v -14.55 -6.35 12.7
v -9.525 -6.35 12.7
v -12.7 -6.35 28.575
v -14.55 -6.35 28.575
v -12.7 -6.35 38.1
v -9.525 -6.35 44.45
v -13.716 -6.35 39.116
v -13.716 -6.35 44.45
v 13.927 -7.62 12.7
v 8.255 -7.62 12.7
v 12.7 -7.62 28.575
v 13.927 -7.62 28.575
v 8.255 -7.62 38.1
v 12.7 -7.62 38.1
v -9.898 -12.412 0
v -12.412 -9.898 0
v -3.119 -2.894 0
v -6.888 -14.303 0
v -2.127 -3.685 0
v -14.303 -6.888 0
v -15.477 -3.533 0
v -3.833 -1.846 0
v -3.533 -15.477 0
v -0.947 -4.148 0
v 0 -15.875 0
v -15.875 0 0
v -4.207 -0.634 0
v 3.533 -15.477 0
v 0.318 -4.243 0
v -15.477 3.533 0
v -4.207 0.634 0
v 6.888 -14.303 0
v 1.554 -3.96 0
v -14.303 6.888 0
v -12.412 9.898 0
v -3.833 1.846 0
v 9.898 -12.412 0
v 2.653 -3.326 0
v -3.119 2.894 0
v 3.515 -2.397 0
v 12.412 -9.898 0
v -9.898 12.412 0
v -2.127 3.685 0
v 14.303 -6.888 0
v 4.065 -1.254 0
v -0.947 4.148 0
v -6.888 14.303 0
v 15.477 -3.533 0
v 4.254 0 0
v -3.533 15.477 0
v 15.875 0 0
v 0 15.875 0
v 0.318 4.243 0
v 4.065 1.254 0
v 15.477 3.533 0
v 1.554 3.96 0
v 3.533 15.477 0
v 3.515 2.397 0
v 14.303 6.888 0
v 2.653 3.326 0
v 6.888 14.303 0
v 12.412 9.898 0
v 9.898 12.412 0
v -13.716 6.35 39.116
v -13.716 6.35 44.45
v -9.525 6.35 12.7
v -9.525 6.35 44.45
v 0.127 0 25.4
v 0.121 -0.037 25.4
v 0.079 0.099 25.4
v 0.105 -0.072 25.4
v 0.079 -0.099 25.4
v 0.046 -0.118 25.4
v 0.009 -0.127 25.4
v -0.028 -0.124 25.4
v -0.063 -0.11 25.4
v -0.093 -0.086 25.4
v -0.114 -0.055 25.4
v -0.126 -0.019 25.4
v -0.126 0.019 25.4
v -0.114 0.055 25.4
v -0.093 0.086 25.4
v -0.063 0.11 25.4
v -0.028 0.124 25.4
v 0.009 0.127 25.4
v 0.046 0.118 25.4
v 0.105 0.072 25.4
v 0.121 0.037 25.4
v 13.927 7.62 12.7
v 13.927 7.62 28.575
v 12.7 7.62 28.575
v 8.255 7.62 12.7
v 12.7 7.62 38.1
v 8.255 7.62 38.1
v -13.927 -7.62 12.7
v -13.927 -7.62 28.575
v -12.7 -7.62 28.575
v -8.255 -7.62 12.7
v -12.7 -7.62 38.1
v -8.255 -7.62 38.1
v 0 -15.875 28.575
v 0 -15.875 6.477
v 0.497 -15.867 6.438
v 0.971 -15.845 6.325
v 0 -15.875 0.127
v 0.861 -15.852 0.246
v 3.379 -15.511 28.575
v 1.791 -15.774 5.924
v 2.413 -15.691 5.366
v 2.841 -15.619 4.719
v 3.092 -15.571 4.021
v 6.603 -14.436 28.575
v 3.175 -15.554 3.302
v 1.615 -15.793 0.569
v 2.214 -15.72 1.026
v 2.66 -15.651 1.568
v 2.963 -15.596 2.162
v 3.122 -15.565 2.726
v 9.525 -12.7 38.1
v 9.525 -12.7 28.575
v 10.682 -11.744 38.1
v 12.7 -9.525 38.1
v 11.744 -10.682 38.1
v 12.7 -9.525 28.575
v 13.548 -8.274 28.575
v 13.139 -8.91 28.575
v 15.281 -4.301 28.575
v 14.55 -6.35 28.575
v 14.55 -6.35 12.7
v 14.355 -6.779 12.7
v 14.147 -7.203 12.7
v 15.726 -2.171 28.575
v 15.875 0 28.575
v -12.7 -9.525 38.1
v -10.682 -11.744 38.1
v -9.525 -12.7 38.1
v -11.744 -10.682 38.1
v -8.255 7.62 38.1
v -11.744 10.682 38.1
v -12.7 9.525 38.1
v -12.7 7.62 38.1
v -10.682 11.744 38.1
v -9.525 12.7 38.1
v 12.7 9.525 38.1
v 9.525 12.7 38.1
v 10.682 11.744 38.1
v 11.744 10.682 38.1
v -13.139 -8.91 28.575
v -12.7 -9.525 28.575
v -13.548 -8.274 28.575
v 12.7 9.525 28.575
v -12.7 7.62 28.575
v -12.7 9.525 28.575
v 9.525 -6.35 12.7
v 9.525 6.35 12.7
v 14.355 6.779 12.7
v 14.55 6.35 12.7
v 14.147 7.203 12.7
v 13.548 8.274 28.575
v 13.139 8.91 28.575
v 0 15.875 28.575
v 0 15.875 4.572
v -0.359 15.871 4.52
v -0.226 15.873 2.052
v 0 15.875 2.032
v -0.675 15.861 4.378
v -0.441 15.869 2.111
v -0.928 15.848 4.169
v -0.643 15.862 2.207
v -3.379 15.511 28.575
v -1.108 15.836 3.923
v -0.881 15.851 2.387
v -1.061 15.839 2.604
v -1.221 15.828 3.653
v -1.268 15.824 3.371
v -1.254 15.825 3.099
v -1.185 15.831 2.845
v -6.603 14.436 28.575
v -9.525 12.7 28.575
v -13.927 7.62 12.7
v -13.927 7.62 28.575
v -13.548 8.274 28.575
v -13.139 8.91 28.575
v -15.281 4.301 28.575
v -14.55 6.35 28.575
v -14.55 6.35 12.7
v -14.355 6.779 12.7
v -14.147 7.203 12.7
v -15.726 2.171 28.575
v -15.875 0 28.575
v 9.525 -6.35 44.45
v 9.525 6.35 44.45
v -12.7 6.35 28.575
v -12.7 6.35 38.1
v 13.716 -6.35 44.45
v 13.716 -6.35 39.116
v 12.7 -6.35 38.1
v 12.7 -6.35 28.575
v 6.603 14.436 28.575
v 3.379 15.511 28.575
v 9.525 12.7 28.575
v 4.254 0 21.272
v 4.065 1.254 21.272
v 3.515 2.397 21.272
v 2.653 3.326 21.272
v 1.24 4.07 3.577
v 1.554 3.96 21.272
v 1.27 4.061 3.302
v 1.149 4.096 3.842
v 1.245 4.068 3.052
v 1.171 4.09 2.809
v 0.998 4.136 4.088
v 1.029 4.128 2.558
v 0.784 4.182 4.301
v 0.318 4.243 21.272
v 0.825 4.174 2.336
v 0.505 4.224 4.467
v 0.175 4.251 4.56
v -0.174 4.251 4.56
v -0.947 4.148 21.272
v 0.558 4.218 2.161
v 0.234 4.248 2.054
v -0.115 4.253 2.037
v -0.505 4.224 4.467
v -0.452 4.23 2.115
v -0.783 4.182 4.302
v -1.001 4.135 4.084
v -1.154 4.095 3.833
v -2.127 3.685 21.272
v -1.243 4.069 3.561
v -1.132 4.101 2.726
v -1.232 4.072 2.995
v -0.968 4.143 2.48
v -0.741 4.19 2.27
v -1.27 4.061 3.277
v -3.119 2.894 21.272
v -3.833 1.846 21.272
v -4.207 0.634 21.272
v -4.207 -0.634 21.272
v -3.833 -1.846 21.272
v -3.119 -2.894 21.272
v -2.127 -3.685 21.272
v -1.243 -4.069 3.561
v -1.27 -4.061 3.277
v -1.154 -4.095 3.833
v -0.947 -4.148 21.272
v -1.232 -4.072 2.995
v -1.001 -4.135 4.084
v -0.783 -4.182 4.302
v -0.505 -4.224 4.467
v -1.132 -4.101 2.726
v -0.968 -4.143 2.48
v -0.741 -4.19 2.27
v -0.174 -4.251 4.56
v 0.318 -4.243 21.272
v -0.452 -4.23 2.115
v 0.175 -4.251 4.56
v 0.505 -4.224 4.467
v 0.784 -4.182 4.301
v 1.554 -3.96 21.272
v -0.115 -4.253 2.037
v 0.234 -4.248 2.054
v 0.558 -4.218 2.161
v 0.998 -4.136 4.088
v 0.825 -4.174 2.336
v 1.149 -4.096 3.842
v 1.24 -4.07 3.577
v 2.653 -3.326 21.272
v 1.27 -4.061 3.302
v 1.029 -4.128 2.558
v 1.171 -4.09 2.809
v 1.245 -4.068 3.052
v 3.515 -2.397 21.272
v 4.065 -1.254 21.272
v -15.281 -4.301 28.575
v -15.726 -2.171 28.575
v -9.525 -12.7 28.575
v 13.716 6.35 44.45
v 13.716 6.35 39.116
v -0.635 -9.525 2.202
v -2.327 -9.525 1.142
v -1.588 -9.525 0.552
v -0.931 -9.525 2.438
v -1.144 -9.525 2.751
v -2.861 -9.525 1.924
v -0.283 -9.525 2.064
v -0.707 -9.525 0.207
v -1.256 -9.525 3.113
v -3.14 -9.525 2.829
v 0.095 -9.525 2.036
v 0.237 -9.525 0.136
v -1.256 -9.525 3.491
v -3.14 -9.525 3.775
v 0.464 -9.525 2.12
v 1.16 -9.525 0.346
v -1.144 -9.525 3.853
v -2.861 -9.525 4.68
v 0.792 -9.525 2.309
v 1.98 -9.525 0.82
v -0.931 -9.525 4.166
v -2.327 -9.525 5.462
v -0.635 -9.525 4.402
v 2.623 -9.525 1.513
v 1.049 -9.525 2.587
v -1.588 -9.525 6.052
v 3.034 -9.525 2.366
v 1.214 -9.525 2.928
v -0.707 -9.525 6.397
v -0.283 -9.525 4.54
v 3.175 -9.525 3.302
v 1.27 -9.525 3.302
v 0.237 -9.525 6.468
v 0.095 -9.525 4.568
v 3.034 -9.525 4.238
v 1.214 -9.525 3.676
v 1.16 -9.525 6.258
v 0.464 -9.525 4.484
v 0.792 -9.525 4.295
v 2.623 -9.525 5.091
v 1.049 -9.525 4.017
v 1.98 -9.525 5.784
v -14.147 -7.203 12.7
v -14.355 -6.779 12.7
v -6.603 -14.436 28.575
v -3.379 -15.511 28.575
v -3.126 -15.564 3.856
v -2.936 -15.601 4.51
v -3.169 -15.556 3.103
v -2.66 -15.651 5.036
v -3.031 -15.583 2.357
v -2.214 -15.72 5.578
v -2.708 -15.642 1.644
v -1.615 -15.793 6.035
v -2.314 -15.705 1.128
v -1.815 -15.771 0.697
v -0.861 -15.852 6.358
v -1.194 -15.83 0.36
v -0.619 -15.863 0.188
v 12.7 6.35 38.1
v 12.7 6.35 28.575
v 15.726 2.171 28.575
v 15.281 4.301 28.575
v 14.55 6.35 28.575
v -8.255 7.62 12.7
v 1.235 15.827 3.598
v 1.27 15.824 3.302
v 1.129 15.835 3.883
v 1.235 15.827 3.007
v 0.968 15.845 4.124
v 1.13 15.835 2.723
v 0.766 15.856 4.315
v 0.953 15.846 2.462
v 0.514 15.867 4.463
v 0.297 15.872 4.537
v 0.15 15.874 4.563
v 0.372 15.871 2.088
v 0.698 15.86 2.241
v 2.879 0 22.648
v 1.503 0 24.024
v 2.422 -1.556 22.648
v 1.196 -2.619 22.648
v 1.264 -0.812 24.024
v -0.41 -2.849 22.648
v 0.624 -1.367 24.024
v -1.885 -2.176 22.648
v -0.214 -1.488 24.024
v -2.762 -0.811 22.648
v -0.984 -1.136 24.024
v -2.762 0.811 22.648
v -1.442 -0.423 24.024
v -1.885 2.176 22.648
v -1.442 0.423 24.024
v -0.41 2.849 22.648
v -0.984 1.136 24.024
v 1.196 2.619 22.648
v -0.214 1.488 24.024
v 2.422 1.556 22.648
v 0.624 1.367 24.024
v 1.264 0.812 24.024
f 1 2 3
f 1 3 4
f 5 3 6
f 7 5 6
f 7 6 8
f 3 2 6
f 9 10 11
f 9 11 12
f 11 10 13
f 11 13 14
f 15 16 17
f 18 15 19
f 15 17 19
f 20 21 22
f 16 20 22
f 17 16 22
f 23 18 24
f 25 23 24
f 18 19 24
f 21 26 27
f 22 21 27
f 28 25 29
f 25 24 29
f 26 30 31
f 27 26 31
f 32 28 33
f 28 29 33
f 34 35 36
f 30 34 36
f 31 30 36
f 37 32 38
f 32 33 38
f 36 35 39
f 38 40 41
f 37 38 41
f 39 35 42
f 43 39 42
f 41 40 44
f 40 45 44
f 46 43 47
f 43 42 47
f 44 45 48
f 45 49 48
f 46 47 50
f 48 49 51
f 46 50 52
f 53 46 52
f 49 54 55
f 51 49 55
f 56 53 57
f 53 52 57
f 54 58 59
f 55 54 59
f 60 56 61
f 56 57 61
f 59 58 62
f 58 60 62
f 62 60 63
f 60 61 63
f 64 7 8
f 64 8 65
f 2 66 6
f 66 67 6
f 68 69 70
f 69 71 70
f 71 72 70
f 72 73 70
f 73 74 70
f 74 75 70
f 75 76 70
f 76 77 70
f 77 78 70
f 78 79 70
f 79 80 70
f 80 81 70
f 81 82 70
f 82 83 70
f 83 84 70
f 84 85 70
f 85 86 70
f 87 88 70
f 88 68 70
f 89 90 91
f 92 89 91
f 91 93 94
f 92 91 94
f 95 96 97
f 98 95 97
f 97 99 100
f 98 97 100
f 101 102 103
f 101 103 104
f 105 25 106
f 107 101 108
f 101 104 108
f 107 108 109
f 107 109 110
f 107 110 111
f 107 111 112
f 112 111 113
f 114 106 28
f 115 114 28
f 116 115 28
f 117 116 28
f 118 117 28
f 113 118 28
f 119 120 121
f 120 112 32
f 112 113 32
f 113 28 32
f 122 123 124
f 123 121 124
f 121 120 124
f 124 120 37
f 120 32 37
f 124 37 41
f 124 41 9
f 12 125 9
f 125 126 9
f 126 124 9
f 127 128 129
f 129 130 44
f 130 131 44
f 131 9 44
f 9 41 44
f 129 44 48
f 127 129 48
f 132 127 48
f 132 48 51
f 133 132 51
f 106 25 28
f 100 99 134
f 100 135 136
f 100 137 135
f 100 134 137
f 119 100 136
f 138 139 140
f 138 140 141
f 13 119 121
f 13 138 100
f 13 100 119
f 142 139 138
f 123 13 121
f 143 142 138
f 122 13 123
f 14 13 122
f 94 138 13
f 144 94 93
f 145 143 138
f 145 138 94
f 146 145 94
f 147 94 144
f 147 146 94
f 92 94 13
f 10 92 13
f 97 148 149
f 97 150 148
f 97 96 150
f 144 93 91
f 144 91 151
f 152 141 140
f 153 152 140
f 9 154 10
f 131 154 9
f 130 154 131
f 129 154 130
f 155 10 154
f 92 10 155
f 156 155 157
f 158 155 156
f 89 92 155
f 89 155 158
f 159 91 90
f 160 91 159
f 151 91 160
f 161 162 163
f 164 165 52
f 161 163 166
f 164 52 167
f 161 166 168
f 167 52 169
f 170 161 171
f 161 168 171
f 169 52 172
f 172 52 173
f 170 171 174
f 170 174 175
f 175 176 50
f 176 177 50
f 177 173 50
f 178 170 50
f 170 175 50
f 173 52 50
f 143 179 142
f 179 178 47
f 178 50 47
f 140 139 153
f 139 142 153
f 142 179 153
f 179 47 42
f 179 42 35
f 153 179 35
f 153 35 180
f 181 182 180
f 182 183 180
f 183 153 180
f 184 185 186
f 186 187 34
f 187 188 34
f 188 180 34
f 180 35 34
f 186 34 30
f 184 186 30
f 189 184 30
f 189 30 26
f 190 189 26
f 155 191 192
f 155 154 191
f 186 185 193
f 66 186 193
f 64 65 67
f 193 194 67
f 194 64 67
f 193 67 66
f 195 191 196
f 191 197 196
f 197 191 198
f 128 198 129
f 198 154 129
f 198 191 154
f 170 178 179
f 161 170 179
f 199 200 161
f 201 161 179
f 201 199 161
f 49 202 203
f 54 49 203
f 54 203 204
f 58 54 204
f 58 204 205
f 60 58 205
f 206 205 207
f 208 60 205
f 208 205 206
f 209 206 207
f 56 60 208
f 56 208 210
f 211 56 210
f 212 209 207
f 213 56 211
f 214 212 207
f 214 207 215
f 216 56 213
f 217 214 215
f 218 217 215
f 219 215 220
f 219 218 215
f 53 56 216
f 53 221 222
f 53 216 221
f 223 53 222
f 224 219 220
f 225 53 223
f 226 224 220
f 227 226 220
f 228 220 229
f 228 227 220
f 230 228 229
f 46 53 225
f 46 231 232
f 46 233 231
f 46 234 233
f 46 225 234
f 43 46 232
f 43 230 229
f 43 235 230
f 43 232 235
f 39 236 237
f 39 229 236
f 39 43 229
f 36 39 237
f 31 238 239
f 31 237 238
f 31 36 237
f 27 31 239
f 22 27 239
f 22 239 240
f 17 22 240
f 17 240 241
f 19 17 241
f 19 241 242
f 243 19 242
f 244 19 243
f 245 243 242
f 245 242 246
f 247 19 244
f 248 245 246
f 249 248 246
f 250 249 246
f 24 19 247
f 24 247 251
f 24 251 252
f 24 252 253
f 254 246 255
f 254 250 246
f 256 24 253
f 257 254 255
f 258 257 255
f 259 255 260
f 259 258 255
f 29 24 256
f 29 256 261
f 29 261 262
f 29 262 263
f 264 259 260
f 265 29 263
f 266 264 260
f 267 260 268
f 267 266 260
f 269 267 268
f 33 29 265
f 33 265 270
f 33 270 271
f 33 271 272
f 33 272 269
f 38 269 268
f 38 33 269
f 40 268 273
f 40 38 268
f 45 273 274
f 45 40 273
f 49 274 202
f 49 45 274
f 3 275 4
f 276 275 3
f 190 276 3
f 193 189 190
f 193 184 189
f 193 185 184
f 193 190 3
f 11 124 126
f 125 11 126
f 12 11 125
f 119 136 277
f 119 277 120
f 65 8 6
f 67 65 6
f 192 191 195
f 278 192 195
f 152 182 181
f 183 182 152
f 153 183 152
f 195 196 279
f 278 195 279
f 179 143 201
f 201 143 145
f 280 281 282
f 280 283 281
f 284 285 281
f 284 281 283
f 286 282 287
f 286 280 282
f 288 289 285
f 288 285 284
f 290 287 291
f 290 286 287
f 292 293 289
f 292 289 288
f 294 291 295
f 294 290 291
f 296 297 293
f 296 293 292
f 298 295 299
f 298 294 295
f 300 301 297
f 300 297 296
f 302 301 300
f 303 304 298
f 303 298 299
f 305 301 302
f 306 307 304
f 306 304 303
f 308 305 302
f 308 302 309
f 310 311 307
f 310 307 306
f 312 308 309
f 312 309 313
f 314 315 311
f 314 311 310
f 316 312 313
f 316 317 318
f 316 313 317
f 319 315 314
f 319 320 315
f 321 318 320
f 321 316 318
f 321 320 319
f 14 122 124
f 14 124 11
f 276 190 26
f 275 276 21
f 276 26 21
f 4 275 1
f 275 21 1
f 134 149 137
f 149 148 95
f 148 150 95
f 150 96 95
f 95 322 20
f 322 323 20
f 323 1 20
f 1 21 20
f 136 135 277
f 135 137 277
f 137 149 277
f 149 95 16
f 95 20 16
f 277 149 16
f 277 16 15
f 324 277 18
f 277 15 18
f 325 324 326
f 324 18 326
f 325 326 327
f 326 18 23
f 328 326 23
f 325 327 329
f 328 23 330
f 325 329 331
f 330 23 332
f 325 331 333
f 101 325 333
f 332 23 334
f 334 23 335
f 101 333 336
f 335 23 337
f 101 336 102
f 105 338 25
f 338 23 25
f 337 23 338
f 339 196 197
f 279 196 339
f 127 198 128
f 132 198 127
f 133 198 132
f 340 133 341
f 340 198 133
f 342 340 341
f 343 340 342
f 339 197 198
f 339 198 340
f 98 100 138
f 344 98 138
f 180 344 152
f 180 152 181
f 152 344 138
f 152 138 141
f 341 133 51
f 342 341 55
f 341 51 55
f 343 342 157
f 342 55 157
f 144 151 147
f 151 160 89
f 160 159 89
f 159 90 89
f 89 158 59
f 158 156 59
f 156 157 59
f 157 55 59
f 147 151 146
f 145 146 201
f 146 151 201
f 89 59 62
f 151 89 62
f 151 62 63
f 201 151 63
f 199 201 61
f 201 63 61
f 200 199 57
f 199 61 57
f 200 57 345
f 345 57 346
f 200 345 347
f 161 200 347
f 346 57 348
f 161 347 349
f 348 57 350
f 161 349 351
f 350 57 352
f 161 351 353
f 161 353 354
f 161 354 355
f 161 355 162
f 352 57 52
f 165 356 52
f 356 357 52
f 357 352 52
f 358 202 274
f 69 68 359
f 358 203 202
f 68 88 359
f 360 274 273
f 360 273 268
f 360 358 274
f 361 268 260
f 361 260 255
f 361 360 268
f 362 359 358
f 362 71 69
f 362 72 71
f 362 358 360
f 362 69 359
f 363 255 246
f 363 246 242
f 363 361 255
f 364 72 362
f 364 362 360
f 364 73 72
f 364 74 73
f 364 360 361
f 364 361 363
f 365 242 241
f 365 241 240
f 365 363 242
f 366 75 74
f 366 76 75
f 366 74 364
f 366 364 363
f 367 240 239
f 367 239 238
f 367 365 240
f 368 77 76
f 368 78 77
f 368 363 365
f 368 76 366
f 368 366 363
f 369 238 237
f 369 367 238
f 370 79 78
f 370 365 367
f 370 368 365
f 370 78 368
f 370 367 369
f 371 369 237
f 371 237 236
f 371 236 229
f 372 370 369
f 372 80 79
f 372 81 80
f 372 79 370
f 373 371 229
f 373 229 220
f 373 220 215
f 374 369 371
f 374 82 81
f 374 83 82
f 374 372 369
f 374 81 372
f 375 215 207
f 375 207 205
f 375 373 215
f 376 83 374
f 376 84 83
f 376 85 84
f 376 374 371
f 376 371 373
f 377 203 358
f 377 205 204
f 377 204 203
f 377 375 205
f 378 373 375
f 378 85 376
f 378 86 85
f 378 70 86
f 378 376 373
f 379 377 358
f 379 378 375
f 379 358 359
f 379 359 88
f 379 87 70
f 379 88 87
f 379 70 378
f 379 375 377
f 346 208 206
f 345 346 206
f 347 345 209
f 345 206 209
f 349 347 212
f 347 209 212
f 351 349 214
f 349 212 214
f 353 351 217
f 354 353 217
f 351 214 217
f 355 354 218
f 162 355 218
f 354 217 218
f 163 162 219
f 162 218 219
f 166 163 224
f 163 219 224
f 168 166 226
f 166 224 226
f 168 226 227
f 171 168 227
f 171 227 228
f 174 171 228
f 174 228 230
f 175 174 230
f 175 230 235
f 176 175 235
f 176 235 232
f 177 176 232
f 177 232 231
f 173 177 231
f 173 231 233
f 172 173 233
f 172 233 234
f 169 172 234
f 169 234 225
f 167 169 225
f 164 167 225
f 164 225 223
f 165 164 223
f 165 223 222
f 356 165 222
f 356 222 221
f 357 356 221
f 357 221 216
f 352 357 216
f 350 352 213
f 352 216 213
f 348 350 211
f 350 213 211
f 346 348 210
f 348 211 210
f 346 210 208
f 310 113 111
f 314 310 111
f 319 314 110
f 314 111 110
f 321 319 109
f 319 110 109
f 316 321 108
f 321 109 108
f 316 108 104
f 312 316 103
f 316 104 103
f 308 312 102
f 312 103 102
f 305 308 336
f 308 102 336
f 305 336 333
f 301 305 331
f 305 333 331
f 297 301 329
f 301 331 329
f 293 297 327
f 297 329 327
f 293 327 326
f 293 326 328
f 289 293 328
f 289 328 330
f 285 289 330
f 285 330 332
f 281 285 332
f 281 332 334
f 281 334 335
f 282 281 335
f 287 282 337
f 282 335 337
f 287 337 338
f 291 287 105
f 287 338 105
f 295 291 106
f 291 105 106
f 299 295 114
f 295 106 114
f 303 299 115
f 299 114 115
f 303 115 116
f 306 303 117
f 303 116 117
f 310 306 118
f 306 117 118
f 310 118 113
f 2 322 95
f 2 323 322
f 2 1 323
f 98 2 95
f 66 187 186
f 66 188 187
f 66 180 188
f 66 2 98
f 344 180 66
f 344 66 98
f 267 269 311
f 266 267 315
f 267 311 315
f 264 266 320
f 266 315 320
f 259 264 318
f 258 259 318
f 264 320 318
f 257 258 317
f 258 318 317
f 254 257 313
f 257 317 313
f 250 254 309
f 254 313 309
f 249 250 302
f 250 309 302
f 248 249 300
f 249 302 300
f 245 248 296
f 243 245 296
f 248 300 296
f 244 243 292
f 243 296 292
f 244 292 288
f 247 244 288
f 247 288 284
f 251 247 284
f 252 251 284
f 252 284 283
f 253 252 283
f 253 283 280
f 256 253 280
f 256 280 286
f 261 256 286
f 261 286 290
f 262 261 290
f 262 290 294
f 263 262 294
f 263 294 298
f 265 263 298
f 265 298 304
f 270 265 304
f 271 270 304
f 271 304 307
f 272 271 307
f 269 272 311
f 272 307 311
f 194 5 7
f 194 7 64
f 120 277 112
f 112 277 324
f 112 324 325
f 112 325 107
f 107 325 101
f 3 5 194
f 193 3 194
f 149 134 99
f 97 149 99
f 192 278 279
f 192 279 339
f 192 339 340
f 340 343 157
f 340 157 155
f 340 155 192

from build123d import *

# Parameters (mm, degrees)
F0_W      = 31.75
F0_H      = 31.75
F0_R      = 4.2545
F1_DEPTH  = 38.1
F2_R      = 1.27
F3_DEPTH  = 76.2
F2_R_2    = 3.175
F4_DEPTH  = 6.35
F6_W      = 31.75
F6_H      = 31.75
F6_W_2    = 25.4
F6_H_2    = 25.4
F7_DEPTH  = 9.525
F8_DEPTH  = 101.6
F9_W      = 3.175
F9_H      = 1.27
F9_W_2    = 1.27
F9_H_2    = 12.7
F10_DEPTH = 25.4
F11_W     = 3.175
F11_H     = 12.7
F11_W_2   = 1.016
F11_W_3   = 4.191
F12_DEPTH = 6.35
F13_SIZE  = 1.01599
F14_W     = 12.7
F14_H     = 12.7
F14_R     = 4.2545
F15_DEPTH = 12.7
F16_SIZE  = 4.1275


# Not quite as in the source:
# - a fillet or chamfer is up to 0.001 mm smaller than in the source, because OpenCascade refuses the exact size


with BuildPart() as f1:
    # F0 (on Top) → F1 (new body)
    with BuildSketch(Plane.XY):
        Rectangle(F0_W, F0_H)
        Circle(F0_R, mode=Mode.SUBTRACT)
    extrude(amount=F1_DEPTH)

    # F2 (on face) → F3 (cut)
    with BuildSketch(Plane.XZ.offset(15.875)):
        with Locations((0, 3.302)):
            Circle(F2_R)
    extrude(amount=-F3_DEPTH, mode=Mode.SUBTRACT)

    # F2 (on face) → F4 (cut)
    with BuildSketch(Plane.XZ.offset(15.875)):
        with Locations((0, 3.302)):
            Circle(F2_R_2)
        with Locations((0, 3.302)):
            Circle(F2_R, mode=Mode.SUBTRACT)
    extrude(amount=-F4_DEPTH, mode=Mode.SUBTRACT)

    # F6 (on face) → F7 (cut)
    with BuildSketch(Plane.XY.offset(38.1)):
        Rectangle(F6_W, F6_H)
        Rectangle(F6_W_2, F6_H_2, mode=Mode.SUBTRACT)
    extrude(amount=-F7_DEPTH, mode=Mode.SUBTRACT)

    # F5 (on face) → F8 (cut)
    with BuildSketch(Plane(origin=(0, 0, 0), x_dir=(1, 0, 0), z_dir=(0, 0, -1))):
        with BuildLine():
            Line((15.875, -15.875), (15.875, 0))
            ThreePointArc((15.875, 0), (11.2253201706, -11.2253201321), (5.44e-08, -15.875))
            Line((5.44e-08, -15.875), (15.875, -15.875))
        make_face()
        with BuildLine():
            Line((-15.875, -15.875), (5.44e-08, -15.875))
            ThreePointArc((5.44e-08, -15.875), (-11.2253201321, -11.2253201706), (-15.875, 0))
            Line((-15.875, 0), (-15.875, -15.875))
        make_face()
        with BuildLine():
            ThreePointArc((-15.875, 0), (-11.2253201513, 11.2253201513), (0, 15.875))
            Line((0, 15.875), (-15.875, 15.875))
            Line((-15.875, 15.875), (-15.875, 0))
        make_face()
        with BuildLine():
            ThreePointArc((0, 15.875), (11.2253201513, 11.2253201513), (15.875, 0))
            Line((15.875, 0), (15.875, 15.875))
            Line((15.875, 15.875), (0, 15.875))
        make_face()
    extrude(amount=-F8_DEPTH, mode=Mode.SUBTRACT)

    # F9 (on face) → F10 (cut)
    with BuildSketch(Plane.XY.offset(38.1)):
        with Locations((-14.2875, 6.985)):
            Rectangle(F9_W, F9_H)
        with Locations((-11.1125, 6.985)):
            Rectangle(F9_W, F9_H)
        with Locations((-8.89, 6.985)):
            Rectangle(F9_W_2, F9_H)
        with Locations((-8.89, 0)):
            Rectangle(F9_W_2, F9_H_2)
        with Locations((-8.89, -6.985)):
            Rectangle(F9_W_2, F9_H)
        with Locations((-11.1125, -6.985)):
            Rectangle(F9_W, F9_H)
        with Locations((-14.2875, -6.985)):
            Rectangle(F9_W, F9_H)
        with Locations((14.2875, 6.985)):
            Rectangle(F9_W, F9_H)
        with Locations((11.1125, 6.985)):
            Rectangle(F9_W, F9_H)
        with Locations((8.89, 6.985)):
            Rectangle(F9_W_2, F9_H)
        with Locations((8.89, 0)):
            Rectangle(F9_W_2, F9_H_2)
        with Locations((8.89, -6.985)):
            Rectangle(F9_W_2, F9_H)
        with Locations((11.1125, -6.985)):
            Rectangle(F9_W, F9_H)
        with Locations((14.2875, -6.985)):
            Rectangle(F9_W, F9_H)
    extrude(amount=-F10_DEPTH, mode=Mode.SUBTRACT)

    # F11 (on face) → F12 (join)
    with BuildSketch(Plane.XY.offset(38.1)):
        with Locations((11.1125, 0)):
            Rectangle(F11_W, F11_H)
        with Locations((13.208, 0)):
            Rectangle(F11_W_2, F11_H)
        with Locations((-11.6205, 0)):
            Rectangle(F11_W_3, F11_H)
    extrude(amount=F12_DEPTH)

    # F13 (size 1.016 in the source; OpenCascade refuses exactly that, so slightly less here)
    f13_edges = [f1.edges().sort_by_distance(p)[0] for p in [
        (13.716, 0, 38.1),
        (-13.716, 0, 38.1),
    ]]
    chamfer(f13_edges, length=F13_SIZE)

    # F14 (on face) → F15 (join)
    with BuildSketch(Plane.XY.offset(38.1)):
        Rectangle(F14_W, F14_H)
        Circle(F14_R, mode=Mode.SUBTRACT)
        Circle(F14_R)
    extrude(amount=-F15_DEPTH)

    # F16
    f16_edges = [f1.edges().sort_by_distance(p)[0] for p in [
        (-4.2545, 0, 25.4),
    ]]
    chamfer(f16_edges, length=F16_SIZE)


solid = f1.part
